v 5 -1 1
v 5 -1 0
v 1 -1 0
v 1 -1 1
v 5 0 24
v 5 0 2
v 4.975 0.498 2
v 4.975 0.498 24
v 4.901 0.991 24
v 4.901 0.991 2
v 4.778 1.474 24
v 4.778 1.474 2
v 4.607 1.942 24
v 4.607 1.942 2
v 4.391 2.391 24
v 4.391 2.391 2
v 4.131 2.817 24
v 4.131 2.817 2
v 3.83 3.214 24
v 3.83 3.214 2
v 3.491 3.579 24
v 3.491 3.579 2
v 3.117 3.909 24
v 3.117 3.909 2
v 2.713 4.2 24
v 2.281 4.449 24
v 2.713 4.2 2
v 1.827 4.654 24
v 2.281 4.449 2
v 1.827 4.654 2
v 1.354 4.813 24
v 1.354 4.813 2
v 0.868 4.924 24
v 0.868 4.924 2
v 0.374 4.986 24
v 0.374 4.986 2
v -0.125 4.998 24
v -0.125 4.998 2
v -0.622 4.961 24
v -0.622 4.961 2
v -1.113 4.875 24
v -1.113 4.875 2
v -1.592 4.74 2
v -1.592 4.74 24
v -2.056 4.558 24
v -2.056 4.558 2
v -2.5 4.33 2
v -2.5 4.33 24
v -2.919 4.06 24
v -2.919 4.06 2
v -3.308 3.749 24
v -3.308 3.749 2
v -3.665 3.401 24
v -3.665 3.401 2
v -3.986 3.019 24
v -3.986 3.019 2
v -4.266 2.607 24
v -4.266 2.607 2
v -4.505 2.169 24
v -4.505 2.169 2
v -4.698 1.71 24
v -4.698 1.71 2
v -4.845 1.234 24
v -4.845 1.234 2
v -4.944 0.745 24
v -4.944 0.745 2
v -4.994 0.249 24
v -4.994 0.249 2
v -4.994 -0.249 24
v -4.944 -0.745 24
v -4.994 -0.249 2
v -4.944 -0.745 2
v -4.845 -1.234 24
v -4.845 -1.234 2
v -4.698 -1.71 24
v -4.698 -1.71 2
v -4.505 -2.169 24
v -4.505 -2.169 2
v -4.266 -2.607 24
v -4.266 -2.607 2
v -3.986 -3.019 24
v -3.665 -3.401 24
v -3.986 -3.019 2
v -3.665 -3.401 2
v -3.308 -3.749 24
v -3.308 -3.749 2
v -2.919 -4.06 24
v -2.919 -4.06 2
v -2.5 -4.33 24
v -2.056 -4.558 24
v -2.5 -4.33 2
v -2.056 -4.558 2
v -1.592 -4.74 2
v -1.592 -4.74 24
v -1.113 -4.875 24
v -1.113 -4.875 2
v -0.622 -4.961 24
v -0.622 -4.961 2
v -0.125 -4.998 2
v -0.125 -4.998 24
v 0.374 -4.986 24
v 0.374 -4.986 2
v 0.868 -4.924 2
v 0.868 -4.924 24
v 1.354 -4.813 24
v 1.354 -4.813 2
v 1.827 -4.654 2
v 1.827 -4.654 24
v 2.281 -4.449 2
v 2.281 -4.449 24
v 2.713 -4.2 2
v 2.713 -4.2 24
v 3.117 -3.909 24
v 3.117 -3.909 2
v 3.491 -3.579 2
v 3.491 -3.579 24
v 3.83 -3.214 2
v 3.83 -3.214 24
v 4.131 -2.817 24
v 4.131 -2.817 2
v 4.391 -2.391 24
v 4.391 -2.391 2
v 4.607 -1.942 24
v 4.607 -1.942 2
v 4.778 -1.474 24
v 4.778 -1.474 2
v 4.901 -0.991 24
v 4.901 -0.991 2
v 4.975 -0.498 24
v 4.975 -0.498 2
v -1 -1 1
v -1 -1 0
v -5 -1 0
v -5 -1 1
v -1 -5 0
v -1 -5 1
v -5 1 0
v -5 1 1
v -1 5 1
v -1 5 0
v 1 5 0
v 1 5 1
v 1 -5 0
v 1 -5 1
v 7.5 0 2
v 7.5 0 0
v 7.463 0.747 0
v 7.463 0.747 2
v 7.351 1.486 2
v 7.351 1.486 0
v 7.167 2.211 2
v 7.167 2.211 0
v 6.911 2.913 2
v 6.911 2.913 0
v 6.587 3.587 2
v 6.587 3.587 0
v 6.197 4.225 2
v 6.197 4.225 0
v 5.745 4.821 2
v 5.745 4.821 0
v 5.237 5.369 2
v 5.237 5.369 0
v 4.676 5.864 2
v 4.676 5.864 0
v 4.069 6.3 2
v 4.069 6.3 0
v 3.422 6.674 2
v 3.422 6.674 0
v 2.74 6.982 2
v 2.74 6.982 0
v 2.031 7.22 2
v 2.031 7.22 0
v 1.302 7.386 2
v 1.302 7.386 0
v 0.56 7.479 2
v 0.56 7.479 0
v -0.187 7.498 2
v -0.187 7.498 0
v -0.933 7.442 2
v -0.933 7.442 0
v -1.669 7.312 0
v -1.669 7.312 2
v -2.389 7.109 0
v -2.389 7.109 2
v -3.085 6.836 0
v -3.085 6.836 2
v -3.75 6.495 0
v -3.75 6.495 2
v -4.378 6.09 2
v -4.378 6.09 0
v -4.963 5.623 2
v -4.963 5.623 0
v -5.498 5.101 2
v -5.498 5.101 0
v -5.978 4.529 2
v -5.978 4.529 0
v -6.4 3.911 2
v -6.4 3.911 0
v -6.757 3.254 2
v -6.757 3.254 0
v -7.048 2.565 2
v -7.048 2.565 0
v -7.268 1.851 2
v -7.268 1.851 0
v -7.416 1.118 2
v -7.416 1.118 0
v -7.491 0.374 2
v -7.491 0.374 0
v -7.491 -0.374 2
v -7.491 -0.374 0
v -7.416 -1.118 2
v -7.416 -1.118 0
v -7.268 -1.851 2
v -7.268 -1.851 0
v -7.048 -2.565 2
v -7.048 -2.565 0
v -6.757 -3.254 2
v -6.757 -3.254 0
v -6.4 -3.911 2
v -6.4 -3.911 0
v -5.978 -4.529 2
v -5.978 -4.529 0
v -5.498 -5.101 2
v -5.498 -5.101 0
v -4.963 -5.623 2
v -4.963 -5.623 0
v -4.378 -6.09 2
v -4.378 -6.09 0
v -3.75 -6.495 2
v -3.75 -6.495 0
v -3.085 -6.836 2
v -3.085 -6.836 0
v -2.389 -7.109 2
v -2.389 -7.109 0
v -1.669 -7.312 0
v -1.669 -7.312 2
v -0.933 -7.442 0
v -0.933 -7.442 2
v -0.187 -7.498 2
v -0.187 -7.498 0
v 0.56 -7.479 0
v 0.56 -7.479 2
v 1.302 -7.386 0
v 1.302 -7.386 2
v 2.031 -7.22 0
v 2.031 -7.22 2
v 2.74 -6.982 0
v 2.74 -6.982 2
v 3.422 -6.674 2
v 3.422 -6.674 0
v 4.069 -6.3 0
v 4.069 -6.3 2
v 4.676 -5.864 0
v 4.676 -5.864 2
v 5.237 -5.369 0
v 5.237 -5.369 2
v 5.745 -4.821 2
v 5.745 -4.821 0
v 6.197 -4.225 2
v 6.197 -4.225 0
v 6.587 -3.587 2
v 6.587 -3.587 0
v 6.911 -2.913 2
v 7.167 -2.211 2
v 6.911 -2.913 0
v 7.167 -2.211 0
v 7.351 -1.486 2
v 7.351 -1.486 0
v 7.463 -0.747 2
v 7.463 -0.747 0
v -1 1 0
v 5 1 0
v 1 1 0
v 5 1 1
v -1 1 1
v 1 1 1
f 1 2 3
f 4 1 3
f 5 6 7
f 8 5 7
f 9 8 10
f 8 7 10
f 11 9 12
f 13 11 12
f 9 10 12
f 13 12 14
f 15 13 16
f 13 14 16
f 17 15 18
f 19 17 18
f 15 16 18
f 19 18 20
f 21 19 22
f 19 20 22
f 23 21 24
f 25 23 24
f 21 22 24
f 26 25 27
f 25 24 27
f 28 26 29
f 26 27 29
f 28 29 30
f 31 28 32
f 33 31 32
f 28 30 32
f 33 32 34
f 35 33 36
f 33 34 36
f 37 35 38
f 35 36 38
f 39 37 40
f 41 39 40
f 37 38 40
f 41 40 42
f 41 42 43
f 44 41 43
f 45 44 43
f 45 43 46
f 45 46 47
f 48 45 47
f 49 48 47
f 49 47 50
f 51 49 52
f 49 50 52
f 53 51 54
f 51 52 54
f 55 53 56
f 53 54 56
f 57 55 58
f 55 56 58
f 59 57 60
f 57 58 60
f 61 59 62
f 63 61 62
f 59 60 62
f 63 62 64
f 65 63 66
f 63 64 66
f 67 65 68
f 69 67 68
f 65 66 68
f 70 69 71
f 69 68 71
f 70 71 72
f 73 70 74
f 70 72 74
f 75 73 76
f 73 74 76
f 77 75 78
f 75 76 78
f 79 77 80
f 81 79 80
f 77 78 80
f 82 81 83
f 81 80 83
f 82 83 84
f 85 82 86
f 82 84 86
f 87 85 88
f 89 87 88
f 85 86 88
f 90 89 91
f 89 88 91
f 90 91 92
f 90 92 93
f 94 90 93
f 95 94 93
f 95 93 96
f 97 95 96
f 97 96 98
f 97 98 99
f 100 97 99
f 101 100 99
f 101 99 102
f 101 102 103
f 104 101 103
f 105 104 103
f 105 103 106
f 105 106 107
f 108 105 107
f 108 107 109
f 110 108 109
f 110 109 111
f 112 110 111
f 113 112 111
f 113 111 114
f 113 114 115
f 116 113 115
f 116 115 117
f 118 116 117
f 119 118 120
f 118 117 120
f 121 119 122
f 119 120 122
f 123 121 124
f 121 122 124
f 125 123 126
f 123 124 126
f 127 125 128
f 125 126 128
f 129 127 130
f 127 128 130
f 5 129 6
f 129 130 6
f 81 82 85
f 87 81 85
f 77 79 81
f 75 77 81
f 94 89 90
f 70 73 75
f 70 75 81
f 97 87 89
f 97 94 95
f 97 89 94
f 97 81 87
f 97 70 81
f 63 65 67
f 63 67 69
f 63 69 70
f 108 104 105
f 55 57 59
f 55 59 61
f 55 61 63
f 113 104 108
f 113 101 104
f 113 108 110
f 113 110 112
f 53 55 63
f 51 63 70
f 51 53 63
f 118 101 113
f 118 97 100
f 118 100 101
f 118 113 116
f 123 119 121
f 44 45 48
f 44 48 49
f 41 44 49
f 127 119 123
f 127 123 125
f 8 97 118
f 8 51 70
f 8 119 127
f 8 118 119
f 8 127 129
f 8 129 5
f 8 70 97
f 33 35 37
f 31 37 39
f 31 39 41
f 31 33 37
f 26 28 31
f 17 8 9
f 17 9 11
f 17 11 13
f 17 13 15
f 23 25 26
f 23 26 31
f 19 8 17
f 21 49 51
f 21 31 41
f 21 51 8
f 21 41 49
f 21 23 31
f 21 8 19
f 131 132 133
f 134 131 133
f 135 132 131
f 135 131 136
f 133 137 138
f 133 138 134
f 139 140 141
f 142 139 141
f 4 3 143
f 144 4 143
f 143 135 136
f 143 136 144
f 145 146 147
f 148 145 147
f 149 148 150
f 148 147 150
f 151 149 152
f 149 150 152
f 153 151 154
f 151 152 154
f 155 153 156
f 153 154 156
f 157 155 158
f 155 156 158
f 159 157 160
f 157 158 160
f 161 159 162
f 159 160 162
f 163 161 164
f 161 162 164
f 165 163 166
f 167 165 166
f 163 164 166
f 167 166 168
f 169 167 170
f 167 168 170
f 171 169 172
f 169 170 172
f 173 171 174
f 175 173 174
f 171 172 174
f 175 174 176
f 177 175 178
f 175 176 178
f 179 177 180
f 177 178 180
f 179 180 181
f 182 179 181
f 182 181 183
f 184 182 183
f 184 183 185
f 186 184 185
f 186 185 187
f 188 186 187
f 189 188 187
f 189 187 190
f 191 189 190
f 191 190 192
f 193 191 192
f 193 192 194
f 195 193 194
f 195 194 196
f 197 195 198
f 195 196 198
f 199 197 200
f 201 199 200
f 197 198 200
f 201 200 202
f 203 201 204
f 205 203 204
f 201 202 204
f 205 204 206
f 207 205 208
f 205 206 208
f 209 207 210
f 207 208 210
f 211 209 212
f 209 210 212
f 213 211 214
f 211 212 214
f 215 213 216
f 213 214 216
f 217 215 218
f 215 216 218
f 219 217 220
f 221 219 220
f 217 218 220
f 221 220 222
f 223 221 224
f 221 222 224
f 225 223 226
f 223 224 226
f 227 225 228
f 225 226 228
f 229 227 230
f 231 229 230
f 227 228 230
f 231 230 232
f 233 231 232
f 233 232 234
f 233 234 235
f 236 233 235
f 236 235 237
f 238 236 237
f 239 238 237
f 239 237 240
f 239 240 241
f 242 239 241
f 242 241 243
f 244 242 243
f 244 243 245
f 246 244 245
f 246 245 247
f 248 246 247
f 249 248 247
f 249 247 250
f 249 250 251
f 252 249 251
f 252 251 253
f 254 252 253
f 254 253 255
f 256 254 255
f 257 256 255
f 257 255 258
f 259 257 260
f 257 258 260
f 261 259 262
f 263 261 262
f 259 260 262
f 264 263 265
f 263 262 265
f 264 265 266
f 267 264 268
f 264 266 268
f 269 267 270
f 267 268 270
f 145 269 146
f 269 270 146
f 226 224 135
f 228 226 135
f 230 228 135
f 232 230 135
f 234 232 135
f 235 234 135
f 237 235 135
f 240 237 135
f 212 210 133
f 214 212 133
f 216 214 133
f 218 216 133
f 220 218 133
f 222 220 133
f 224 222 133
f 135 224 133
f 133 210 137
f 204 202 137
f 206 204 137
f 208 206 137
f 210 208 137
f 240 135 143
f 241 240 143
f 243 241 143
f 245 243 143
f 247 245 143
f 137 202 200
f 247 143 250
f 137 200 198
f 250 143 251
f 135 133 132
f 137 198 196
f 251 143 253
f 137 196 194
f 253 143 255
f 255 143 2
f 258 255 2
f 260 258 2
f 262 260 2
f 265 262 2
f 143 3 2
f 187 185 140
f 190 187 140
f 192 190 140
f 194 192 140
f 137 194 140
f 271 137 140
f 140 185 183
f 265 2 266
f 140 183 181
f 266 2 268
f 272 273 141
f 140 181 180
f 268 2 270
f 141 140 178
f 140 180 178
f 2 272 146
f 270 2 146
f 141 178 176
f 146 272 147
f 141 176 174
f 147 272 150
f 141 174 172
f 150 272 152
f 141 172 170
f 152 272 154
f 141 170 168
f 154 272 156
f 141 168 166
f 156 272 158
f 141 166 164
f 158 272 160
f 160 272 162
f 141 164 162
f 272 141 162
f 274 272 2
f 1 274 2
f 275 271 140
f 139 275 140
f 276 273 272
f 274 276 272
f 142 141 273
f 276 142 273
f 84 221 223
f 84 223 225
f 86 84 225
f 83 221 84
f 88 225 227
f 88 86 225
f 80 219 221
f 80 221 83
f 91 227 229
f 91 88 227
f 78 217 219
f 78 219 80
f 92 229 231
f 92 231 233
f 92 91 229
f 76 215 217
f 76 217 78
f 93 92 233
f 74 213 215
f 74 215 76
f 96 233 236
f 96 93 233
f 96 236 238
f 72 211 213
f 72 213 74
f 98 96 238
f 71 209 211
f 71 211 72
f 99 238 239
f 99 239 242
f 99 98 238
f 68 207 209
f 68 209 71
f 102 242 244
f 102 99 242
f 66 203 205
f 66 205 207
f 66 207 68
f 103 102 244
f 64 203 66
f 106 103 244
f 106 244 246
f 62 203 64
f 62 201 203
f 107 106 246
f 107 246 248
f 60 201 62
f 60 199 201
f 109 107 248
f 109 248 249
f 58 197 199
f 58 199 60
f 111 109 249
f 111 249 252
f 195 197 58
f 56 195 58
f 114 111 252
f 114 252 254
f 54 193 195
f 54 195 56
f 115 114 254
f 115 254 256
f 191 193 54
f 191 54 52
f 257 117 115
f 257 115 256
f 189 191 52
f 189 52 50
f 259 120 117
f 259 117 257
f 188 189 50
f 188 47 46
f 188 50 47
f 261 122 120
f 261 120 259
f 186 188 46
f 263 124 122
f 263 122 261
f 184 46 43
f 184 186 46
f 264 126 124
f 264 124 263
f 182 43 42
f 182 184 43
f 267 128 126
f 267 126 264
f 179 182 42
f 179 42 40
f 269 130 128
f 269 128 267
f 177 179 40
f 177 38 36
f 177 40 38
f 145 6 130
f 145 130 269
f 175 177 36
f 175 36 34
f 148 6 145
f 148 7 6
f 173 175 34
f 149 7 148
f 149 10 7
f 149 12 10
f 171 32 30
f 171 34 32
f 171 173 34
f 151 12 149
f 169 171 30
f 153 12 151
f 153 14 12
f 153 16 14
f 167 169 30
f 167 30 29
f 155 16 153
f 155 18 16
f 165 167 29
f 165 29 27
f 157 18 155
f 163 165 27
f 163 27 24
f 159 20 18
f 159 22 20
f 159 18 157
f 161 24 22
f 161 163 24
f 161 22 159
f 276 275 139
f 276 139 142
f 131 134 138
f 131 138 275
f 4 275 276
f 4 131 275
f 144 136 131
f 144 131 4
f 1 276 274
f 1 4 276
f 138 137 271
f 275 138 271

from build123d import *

# Parameters (mm, degrees)
F0_R     = 7.5
F1_DEPTH = 2
F2_R     = 5
F3_DEPTH = 22
F4_W     = 4
F4_H     = 2
F4_W_2   = 2
F4_H_2   = 4
F5_DEPTH = 1


with BuildPart() as f1:
    # F0 (on Top) → F1 (new body)
    with BuildSketch(Plane.XY):
        Circle(F0_R)
    extrude(amount=F1_DEPTH)

    # F2 (on face) → F3 (join)
    with BuildSketch(Plane.XY.offset(2)):
        Circle(F2_R)
    extrude(amount=F3_DEPTH)

    # F4 (on face) → F5 (cut)
    with BuildSketch(Plane(origin=(0, 0, 0), x_dir=(1, 0, 0), z_dir=(0, 0, -1))):
        with Locations((3, 0)):
            Rectangle(F4_W, F4_H)
        with Locations((0, -3)):
            Rectangle(F4_W_2, F4_H_2)
        Rectangle(F4_W_2, F4_H)
        with Locations((-3, 0)):
            Rectangle(F4_W, F4_H)
        with Locations((0, 3)):
            Rectangle(F4_W_2, F4_H_2)
    extrude(amount=-F5_DEPTH, mode=Mode.SUBTRACT)


solid = f1.part
